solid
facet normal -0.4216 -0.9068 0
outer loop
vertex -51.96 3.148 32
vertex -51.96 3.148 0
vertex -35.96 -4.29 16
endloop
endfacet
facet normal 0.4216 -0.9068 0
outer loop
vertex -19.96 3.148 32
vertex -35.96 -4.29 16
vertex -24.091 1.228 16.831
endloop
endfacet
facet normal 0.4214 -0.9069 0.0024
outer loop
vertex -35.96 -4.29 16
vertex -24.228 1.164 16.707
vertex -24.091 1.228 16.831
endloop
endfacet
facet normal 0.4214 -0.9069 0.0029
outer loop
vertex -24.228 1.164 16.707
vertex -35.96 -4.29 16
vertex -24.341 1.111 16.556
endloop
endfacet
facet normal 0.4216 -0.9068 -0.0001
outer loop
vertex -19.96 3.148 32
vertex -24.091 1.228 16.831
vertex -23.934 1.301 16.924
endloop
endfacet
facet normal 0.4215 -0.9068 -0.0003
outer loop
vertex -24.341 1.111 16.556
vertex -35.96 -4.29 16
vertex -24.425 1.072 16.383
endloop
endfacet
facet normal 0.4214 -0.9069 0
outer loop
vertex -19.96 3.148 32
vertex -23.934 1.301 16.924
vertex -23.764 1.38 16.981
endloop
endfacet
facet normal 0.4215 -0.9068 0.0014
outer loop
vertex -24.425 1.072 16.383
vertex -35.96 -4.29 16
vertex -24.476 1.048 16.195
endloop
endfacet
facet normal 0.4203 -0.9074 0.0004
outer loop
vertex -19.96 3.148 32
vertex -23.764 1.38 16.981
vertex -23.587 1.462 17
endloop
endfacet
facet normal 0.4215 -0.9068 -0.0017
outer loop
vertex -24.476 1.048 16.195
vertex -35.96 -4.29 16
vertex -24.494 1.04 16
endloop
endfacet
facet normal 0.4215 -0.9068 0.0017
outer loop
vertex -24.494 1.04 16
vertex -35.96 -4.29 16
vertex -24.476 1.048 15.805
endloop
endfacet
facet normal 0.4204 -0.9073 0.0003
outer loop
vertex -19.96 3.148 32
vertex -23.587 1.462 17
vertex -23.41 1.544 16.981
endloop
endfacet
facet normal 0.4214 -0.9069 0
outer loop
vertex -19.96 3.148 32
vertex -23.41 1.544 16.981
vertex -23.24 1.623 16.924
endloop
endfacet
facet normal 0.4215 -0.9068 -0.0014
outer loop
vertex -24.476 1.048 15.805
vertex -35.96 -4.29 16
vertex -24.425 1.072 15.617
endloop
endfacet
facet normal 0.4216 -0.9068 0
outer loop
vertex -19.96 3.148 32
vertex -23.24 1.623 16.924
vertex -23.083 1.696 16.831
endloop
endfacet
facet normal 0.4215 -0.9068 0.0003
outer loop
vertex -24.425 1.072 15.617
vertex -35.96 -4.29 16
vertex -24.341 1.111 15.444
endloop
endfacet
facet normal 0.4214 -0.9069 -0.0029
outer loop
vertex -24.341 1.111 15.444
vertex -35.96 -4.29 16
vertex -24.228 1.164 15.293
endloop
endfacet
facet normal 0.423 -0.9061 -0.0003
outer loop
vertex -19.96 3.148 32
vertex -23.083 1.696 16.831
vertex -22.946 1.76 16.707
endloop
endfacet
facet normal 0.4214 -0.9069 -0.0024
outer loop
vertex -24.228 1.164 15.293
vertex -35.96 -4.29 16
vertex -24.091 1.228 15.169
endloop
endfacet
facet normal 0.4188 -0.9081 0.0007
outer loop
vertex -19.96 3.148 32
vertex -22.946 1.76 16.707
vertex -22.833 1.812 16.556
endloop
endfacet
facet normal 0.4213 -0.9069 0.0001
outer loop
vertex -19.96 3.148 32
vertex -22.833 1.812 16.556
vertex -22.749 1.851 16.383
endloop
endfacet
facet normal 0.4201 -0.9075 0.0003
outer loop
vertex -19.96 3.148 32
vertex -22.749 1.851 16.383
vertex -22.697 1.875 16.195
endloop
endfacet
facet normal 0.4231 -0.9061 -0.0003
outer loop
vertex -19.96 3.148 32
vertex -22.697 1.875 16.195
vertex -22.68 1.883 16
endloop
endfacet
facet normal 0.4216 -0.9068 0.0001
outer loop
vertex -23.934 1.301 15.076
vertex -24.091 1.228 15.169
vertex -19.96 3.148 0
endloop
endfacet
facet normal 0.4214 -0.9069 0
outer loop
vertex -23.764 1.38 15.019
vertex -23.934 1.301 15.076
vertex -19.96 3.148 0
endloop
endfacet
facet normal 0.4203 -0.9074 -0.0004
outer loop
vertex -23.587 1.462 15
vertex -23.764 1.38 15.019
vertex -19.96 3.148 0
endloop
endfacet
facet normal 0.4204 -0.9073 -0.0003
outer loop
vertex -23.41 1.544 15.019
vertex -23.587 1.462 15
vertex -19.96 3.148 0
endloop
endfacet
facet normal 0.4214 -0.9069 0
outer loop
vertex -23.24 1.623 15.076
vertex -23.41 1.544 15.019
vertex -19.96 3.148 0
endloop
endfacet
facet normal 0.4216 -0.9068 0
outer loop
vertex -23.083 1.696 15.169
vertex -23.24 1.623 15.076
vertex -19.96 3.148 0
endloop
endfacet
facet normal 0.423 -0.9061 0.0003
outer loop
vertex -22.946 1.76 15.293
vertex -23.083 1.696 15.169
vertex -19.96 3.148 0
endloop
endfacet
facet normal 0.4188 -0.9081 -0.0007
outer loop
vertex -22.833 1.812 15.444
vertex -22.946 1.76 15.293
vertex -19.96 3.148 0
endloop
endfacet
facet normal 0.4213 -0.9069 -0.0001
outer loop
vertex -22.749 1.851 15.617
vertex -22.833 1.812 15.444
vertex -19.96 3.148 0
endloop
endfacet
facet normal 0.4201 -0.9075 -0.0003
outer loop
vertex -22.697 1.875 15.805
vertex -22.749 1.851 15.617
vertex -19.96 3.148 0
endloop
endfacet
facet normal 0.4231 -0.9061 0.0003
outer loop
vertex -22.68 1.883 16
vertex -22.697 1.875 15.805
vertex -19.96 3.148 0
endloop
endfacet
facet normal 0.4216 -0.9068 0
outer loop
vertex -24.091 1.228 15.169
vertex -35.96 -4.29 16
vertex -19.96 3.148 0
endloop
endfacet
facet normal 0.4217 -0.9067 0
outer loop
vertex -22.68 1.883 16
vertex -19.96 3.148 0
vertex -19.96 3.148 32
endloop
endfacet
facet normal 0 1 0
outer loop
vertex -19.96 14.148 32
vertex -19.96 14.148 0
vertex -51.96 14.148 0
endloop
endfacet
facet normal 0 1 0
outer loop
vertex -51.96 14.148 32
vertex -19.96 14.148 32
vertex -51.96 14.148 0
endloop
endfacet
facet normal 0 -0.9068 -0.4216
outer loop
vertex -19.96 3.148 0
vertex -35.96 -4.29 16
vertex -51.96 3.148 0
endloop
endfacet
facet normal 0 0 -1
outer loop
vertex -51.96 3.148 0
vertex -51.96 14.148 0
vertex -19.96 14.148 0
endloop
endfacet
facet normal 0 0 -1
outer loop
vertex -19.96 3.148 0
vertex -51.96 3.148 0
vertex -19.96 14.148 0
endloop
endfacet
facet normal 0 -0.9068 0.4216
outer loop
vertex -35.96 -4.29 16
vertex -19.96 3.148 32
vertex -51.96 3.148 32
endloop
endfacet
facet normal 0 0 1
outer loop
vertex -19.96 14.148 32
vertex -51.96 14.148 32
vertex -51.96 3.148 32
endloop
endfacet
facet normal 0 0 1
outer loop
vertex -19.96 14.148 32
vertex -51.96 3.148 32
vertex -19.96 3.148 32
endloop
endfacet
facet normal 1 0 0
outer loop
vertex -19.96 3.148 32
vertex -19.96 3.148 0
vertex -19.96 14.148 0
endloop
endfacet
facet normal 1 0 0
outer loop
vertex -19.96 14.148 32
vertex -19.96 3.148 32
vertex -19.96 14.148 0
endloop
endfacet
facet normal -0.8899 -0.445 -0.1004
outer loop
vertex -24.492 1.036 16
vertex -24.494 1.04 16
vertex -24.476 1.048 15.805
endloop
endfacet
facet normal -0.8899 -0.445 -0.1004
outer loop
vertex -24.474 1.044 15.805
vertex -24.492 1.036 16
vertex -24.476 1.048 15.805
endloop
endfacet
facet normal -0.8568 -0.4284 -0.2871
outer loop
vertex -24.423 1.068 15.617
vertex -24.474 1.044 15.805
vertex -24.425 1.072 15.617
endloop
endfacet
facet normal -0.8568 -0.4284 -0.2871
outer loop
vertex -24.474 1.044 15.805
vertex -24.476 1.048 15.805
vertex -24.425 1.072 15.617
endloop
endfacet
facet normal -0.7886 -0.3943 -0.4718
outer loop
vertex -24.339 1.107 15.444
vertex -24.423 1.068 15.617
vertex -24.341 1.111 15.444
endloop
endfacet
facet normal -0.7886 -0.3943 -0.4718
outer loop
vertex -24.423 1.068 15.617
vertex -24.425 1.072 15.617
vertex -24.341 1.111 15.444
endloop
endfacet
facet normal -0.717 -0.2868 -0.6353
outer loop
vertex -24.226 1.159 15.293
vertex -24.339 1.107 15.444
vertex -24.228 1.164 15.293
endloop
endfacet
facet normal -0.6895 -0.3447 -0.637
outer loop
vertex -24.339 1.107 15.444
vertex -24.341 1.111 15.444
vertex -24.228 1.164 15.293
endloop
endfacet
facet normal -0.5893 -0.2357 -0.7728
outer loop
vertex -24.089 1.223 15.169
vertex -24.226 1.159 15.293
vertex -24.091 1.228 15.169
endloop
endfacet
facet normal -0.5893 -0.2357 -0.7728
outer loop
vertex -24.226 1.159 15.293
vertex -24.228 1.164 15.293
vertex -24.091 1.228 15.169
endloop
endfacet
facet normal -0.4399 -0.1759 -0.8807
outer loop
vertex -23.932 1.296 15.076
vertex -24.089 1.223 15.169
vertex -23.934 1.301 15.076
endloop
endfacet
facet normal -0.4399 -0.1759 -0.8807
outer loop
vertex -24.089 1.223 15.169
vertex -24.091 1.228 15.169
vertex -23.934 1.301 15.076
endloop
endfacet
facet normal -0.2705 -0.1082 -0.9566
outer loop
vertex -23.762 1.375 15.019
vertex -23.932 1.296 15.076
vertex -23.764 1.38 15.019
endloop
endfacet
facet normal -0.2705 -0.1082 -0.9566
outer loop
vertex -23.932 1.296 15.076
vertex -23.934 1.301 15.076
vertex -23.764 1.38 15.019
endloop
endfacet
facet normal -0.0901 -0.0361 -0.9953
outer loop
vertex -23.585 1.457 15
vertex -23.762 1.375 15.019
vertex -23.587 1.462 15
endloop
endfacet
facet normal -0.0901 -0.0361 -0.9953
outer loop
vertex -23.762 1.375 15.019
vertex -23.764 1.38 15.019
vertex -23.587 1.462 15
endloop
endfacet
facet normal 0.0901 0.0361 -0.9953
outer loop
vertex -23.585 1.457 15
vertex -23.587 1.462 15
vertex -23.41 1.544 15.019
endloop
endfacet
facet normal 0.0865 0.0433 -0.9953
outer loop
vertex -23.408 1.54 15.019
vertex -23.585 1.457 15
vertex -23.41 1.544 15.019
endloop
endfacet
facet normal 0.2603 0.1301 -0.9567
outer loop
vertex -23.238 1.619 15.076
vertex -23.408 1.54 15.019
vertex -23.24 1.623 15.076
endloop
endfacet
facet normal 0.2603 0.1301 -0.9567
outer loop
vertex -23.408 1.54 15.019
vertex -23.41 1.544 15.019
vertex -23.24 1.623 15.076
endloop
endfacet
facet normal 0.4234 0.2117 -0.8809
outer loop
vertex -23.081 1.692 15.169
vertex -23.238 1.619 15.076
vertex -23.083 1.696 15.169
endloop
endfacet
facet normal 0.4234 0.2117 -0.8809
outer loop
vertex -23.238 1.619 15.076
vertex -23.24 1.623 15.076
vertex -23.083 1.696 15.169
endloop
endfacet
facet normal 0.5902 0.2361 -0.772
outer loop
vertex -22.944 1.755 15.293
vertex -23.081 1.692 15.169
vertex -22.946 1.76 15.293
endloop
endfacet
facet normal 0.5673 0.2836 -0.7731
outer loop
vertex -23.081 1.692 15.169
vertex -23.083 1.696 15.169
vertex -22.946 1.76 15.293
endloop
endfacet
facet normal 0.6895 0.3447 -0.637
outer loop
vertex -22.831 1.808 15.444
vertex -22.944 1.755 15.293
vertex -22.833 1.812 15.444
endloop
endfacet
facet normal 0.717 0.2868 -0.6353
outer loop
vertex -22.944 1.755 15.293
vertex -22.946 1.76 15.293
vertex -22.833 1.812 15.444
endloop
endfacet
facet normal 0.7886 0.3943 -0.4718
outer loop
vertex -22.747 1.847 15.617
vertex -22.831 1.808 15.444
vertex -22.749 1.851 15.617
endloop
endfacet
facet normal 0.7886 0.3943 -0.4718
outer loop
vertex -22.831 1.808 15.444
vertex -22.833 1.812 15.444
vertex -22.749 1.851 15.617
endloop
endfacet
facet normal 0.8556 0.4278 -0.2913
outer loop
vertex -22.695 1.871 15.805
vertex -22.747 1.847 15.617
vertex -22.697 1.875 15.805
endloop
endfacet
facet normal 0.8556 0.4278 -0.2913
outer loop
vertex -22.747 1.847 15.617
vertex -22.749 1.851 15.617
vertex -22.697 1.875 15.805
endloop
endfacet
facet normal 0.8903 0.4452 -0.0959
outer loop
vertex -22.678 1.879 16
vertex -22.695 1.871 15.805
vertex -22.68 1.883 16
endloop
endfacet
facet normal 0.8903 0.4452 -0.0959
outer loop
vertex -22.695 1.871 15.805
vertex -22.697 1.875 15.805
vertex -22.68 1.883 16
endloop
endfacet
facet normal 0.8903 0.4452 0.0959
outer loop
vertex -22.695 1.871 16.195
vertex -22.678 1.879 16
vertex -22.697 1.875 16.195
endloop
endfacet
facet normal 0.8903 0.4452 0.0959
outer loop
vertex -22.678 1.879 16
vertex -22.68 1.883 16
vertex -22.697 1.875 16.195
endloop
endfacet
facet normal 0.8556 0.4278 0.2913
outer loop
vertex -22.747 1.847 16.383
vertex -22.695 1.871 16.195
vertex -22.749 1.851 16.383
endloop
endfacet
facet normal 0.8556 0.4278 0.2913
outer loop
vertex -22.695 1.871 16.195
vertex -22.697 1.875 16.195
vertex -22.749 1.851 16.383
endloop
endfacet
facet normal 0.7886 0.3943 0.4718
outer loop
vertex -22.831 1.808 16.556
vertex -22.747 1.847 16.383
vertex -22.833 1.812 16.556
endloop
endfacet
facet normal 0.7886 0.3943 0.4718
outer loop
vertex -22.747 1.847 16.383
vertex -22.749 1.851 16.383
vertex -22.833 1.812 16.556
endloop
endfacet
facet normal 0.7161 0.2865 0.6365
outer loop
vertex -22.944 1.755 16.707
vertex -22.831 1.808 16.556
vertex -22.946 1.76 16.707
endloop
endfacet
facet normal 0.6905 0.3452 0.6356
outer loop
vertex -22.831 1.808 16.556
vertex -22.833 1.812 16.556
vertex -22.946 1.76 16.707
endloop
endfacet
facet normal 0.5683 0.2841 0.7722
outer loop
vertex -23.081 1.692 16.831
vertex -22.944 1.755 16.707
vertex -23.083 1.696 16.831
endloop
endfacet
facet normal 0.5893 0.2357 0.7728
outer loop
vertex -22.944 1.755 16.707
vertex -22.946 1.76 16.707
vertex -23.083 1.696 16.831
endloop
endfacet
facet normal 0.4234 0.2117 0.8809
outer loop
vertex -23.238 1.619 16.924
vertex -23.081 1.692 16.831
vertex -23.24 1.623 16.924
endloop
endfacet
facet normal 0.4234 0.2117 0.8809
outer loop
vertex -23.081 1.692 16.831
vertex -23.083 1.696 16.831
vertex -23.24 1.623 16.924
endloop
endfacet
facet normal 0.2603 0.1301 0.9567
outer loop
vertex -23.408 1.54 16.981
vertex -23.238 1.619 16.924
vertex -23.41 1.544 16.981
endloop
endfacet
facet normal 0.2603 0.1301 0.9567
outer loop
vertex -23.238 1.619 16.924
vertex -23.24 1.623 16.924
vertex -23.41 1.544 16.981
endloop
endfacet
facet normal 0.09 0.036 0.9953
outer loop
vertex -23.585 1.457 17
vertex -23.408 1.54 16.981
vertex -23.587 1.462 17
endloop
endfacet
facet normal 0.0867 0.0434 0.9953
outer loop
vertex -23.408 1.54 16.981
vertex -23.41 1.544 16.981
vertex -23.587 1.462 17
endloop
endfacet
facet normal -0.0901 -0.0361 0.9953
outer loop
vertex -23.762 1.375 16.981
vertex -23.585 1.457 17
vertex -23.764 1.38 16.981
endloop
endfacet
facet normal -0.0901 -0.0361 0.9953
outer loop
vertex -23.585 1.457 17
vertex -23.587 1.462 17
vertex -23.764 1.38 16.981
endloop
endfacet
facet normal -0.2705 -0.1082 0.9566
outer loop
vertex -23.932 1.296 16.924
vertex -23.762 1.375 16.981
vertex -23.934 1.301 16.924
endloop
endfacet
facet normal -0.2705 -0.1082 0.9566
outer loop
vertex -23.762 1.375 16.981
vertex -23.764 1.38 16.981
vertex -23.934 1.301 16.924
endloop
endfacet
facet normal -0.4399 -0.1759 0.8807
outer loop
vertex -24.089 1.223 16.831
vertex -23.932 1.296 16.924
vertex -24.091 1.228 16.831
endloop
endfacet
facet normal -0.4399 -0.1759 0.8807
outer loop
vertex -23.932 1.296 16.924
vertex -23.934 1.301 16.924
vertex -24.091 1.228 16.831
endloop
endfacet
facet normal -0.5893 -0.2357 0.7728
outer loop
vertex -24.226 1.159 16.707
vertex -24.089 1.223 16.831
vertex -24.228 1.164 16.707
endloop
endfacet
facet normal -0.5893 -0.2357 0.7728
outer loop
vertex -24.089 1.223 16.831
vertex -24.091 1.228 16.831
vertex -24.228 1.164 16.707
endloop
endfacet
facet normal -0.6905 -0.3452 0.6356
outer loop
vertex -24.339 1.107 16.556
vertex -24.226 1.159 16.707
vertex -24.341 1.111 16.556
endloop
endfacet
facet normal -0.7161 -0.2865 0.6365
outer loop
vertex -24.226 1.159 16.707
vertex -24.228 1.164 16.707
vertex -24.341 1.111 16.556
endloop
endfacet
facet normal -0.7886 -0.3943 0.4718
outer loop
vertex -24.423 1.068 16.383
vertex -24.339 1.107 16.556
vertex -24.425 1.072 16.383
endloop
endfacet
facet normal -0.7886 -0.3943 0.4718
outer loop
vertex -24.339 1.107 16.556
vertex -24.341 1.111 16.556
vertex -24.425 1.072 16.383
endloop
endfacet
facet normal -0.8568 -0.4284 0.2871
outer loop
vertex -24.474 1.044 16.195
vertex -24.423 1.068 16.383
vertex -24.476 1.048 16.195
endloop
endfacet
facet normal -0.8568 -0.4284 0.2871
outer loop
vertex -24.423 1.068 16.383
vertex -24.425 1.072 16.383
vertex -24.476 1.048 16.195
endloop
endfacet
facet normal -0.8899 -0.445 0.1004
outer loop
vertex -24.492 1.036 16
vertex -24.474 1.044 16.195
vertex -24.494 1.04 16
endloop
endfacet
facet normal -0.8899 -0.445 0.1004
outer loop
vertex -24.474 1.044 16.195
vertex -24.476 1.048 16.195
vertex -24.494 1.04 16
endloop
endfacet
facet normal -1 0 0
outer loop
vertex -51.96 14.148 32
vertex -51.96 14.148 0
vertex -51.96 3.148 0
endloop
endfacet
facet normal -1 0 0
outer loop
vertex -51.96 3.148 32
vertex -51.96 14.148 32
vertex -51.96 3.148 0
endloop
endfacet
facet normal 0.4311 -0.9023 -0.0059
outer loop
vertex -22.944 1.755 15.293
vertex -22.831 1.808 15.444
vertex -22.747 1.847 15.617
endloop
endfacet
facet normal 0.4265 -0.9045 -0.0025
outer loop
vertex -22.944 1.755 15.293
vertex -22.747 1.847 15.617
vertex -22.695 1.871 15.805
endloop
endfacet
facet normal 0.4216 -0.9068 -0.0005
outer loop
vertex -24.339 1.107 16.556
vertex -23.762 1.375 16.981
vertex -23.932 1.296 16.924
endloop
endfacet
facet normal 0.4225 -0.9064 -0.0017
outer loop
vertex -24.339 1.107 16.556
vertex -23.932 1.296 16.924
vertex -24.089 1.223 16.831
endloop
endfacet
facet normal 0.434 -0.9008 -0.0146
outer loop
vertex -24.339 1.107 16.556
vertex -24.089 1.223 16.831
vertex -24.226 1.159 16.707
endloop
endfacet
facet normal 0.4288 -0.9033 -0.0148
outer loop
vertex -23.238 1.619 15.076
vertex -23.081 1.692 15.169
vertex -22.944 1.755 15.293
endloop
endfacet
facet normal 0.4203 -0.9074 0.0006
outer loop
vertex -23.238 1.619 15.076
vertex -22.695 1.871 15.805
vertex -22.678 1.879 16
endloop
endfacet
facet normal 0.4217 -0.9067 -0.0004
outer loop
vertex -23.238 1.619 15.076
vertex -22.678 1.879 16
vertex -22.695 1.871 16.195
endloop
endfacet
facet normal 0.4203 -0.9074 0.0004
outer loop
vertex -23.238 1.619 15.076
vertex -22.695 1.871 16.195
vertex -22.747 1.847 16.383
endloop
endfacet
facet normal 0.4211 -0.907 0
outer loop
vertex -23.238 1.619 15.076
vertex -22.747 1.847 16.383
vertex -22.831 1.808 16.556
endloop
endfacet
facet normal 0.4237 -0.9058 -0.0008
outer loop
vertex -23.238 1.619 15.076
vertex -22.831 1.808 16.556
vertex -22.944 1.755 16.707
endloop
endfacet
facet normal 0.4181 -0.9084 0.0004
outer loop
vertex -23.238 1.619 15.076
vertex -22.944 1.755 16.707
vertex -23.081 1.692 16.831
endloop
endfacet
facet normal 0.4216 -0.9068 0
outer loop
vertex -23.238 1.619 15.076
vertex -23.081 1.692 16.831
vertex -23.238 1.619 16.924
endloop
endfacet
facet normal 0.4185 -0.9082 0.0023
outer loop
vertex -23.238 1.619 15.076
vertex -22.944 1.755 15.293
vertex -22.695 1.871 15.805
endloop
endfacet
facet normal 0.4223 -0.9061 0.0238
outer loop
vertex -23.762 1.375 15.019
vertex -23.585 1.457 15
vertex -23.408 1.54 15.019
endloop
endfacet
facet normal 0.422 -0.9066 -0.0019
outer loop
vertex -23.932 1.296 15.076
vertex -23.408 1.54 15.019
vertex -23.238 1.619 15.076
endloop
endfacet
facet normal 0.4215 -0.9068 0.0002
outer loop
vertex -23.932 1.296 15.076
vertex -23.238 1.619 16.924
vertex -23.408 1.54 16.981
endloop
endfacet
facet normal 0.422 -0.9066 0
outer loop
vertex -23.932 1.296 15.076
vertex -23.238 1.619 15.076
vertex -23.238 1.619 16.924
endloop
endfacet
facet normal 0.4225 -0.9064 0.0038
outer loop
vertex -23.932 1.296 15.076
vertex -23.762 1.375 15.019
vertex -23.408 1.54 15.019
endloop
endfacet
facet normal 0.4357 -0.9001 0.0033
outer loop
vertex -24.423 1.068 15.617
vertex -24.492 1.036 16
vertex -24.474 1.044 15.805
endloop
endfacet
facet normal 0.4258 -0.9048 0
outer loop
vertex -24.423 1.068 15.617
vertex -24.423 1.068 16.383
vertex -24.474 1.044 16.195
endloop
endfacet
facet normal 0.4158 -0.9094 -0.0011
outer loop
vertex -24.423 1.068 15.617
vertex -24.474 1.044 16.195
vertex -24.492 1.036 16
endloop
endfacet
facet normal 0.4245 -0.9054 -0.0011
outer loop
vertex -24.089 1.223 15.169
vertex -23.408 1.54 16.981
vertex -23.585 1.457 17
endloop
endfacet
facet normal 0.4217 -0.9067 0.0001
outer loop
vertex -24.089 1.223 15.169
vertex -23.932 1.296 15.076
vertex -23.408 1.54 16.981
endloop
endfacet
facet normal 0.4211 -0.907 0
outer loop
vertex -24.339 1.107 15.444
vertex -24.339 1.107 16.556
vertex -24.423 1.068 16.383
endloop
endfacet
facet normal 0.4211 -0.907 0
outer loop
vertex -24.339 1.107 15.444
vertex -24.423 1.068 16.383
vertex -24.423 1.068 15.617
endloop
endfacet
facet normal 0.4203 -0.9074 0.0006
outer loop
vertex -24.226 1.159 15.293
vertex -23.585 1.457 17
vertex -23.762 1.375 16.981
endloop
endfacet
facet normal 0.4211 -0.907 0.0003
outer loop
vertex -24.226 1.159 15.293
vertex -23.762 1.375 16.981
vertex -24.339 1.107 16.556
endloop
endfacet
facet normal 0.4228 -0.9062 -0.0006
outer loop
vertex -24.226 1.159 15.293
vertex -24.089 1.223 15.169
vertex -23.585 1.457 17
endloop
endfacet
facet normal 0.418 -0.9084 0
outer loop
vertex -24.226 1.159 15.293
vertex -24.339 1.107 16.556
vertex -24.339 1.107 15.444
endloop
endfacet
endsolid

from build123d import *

# Parameters (mm, degrees)
SALIENTE_EXTRUIR1_DEPTH = 32
CORTAR_EXTRUIR1_DEPTH   = 33
CROQUIS4_R              = 1
SALIENTE_EXTRUIR2_DEPTH = 0.005


with BuildPart() as part:
    # Croquis1 → Saliente-Extruir1 (new body)
    with BuildSketch(Plane.XY):
        Polygon((-51.959662641, 14.148169014), (-51.959662641, 3.148169014), (-35.959662641, -4.290206314), (-19.959662641, 3.148169014), (-19.959662641, 14.148169014), align=None)
    extrude(amount=SALIENTE_EXTRUIR1_DEPTH)

    # Croquis2 → Cortar-Extruir1 (cut)
    with BuildSketch(Plane(origin=(-19.959662641, 0, 0), x_dir=(0, 0, -1), z_dir=(1, 0, 0))):
        Polygon((0, -4.290206314), (-16, -4.290206314), (0, 3.148169014), align=None)
        Polygon((-32, -4.290206314), (-32, 3.148169014), (-16, -4.290206314), align=None)
    extrude(amount=-CORTAR_EXTRUIR1_DEPTH, mode=Mode.SUBTRACT)

    # Croquis4 → Saliente-Extruir2 (add)
    with BuildSketch(Plane(origin=(-4.750700642, 10.218791996, 0), x_dir=(-0.906796627, -0.421568354, 0), z_dir=(0.421568354, -0.906796627, 0))):
        with Locations((20.772186335, -16)):
            Circle(CROQUIS4_R)
    extrude(amount=SALIENTE_EXTRUIR2_DEPTH)


solid = part.part
